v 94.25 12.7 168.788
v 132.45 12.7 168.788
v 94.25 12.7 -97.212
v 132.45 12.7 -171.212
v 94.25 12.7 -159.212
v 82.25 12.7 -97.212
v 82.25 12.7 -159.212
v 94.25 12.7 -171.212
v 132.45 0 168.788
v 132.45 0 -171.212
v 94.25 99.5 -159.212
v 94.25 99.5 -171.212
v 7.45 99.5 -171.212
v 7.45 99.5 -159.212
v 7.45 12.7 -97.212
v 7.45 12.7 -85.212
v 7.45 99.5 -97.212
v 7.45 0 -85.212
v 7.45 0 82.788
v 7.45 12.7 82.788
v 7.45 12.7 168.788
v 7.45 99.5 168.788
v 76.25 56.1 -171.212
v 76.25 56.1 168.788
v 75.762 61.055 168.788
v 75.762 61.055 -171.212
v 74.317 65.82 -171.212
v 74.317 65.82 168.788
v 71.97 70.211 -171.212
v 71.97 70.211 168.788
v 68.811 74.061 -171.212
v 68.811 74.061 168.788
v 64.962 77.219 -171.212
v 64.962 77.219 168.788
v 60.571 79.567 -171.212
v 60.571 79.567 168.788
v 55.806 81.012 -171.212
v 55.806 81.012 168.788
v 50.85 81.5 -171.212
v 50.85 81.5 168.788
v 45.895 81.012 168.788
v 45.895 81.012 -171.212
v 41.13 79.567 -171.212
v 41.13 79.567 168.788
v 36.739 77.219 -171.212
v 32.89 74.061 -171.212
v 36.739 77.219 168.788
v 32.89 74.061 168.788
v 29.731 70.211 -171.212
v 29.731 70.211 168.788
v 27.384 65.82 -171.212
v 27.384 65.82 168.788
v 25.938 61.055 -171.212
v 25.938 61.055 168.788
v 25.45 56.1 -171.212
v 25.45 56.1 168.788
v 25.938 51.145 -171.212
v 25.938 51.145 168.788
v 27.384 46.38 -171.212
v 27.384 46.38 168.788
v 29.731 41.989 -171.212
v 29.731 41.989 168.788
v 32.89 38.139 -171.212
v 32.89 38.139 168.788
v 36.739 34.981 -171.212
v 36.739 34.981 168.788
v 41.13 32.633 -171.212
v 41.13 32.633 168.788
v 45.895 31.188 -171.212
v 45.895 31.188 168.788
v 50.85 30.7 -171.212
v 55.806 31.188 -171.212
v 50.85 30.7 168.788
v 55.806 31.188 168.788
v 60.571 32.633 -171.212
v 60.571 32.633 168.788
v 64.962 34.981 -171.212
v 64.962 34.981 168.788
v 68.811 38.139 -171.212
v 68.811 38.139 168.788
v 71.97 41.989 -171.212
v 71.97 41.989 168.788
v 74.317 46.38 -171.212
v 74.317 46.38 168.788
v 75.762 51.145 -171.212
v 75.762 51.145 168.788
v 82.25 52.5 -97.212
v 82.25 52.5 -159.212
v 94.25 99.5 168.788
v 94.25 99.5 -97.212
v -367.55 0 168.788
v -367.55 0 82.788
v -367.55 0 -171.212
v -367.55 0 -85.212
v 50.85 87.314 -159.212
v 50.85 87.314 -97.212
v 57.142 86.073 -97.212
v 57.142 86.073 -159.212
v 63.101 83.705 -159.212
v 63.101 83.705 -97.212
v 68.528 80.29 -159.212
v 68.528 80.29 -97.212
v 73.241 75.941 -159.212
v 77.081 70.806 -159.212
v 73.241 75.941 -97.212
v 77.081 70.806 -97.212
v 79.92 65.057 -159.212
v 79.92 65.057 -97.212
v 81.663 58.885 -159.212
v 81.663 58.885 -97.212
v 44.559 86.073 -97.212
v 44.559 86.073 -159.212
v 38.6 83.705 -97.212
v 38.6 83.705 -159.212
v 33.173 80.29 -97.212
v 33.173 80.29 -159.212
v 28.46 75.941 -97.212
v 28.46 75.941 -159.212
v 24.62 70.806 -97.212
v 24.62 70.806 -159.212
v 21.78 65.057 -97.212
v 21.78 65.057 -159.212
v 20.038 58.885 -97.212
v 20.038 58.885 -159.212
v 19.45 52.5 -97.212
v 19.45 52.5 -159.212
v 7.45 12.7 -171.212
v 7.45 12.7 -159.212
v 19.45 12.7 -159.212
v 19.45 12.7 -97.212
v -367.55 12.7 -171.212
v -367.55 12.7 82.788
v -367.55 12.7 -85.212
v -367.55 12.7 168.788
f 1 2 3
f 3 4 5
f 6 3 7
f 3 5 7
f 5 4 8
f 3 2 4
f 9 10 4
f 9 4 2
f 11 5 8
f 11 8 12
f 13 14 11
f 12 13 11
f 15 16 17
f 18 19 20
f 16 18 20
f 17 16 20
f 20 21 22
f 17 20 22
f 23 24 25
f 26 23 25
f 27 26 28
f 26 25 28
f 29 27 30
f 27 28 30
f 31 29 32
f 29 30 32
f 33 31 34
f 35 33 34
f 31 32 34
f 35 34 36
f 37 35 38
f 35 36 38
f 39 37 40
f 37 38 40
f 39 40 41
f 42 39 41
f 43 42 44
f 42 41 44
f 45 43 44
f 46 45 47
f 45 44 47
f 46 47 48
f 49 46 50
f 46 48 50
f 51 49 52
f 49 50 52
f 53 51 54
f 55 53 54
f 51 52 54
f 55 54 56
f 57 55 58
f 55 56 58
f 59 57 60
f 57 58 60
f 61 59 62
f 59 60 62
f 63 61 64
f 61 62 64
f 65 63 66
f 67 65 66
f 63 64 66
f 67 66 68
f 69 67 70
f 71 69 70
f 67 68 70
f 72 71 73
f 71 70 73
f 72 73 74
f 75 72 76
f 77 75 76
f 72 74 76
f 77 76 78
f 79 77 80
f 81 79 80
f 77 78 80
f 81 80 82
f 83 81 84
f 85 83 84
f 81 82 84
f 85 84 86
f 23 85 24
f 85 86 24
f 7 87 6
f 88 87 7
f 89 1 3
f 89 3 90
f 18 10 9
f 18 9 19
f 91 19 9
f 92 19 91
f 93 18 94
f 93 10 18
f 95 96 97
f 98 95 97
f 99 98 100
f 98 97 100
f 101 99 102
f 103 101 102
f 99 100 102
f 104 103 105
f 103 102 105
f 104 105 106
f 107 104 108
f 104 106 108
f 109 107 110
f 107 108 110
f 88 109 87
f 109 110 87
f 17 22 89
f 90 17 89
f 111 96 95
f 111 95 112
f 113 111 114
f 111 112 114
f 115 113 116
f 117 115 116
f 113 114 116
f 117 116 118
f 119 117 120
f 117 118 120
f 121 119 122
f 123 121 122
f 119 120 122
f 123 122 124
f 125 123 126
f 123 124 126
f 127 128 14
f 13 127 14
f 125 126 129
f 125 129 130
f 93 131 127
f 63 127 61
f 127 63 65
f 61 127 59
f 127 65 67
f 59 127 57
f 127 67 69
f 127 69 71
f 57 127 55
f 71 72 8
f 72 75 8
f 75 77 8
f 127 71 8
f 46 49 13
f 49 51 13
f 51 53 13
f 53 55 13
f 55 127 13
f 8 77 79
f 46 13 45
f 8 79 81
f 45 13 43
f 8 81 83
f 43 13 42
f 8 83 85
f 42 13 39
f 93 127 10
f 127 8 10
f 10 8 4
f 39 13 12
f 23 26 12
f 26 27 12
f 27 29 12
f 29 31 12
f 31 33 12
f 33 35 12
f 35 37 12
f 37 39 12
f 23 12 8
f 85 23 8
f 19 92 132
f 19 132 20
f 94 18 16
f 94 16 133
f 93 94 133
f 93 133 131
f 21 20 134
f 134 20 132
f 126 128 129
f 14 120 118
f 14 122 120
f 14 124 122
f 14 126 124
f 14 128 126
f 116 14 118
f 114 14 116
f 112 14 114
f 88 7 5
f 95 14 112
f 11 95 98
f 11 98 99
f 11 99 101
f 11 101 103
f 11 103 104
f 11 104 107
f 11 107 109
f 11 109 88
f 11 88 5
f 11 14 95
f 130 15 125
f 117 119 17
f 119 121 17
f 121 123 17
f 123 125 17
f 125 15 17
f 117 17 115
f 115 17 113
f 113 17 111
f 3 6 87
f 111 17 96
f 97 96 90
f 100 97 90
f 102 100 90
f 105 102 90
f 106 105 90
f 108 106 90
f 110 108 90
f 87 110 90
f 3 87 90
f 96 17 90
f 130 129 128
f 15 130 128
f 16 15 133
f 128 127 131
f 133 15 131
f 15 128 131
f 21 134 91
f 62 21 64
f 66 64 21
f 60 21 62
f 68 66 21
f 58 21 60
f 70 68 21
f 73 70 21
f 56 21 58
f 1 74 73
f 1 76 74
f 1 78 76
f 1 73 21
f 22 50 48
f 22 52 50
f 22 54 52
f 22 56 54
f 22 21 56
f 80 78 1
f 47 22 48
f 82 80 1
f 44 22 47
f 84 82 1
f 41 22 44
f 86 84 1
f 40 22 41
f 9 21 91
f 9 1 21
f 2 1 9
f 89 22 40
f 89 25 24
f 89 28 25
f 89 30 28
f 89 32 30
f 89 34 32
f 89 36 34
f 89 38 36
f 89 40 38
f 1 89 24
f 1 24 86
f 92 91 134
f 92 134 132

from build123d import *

# Parameters (mm, degrees)
BOSS_EXTRUDE1_DEPTH = 12.7
SKETCH4_W           = 86.8
SKETCH4_H           = 86.8
SKETCH4_R           = 25.4
BOSS_EXTRUDE3_DEPTH = 340
SKETCH6_W           = 86.8
SKETCH6_H           = 62
CUT_EXTRUDE3_DEPTH  = 12
SKETCH7_W           = 62
SKETCH7_H           = 74.8
CUT_EXTRUDE4_DEPTH  = 12
SKETCH8_W           = 62
SKETCH8_H           = 74.8
CUT_EXTRUDE5_DEPTH  = 12
FILLET2_R           = 35


with BuildPart() as part:
    # Sketch1 → Boss-Extrude1 (new body)
    with BuildSketch(Plane(origin=(0, 0, 0), x_dir=(1, 0, 0), z_dir=(0, 1, 0))):
        Polygon((-367.549574024, 171.211944752), (132.450425976, 171.211944752), (132.450425976, -168.788055248), (-367.549574024, -168.788055248), (-367.549574024, -82.788055248), (7.450425976, -82.788055248), (7.450425976, 85.211944752), (-367.549574024, 85.211944752), align=None)
    extrude(amount=BOSS_EXTRUDE1_DEPTH)

    # Sketch4 → Boss-Extrude3 (add)
    with BuildSketch(Plane.XY.offset(168.788055248)):
        with Locations((50.850425976, 56.1)):
            Rectangle(SKETCH4_W, SKETCH4_H)
        with Locations((50.850425976, 56.1)):
            Circle(SKETCH4_R, mode=Mode.SUBTRACT)
    extrude(amount=-BOSS_EXTRUDE3_DEPTH)

    # Sketch6 → Cut-Extrude3 (cut)
    with BuildSketch(Plane(origin=(0, 99.5, 0), x_dir=(1, 0, 0), z_dir=(0, 1, 0))):
        with Locations((50.850425976, 128.211944752)):
            Rectangle(SKETCH6_W, SKETCH6_H)
    extrude(amount=-CUT_EXTRUDE3_DEPTH, mode=Mode.SUBTRACT)

    # Sketch7 → Cut-Extrude4 (cut)
    with BuildSketch(Plane.ZY.offset(-7.450425976)):
        with Locations((-128.211944752, 50.1)):
            Rectangle(SKETCH7_W, SKETCH7_H)
    extrude(amount=-CUT_EXTRUDE4_DEPTH, mode=Mode.SUBTRACT)

    # Sketch8 → Cut-Extrude5 (cut)
    with BuildSketch(Plane(origin=(94.250425976, 0, 0), x_dir=(0, 0, -1), z_dir=(1, 0, 0))):
        with Locations((128.211944752, 50.1)):
            Rectangle(SKETCH8_W, SKETCH8_H)
    extrude(amount=-CUT_EXTRUDE5_DEPTH, mode=Mode.SUBTRACT)

    # Fillet2
    # the kernel refuses this fillet: 35 mm, written as the material it takes off along each edge
    with BuildSketch(Plane(origin=(82.250425976, 87.5, -97.211944752), x_dir=(-1, 0, 0), z_dir=(0, 0, -1))) as fillet2_piece_1:
        with BuildLine():
            CenterArc((FILLET2_R, -FILLET2_R), FILLET2_R, 90, 90)
            Line((0, -FILLET2_R), (0, 0))
            Line((0, 0), (FILLET2_R, 0))
        make_face()
    extrude(amount=62, mode=Mode.SUBTRACT)
    with BuildSketch(Plane(origin=(19.450425976, 87.5, -159.211944752), x_dir=(0, -1, 0), z_dir=(0, 0, 1))) as fillet2_piece_2:
        with BuildLine():
            CenterArc((FILLET2_R, FILLET2_R), FILLET2_R, 180, 90)
            Line((0, FILLET2_R), (0, 0))
            Line((0, 0), (FILLET2_R, 0))
        make_face()
    extrude(amount=62, mode=Mode.SUBTRACT)


solid = part.part
